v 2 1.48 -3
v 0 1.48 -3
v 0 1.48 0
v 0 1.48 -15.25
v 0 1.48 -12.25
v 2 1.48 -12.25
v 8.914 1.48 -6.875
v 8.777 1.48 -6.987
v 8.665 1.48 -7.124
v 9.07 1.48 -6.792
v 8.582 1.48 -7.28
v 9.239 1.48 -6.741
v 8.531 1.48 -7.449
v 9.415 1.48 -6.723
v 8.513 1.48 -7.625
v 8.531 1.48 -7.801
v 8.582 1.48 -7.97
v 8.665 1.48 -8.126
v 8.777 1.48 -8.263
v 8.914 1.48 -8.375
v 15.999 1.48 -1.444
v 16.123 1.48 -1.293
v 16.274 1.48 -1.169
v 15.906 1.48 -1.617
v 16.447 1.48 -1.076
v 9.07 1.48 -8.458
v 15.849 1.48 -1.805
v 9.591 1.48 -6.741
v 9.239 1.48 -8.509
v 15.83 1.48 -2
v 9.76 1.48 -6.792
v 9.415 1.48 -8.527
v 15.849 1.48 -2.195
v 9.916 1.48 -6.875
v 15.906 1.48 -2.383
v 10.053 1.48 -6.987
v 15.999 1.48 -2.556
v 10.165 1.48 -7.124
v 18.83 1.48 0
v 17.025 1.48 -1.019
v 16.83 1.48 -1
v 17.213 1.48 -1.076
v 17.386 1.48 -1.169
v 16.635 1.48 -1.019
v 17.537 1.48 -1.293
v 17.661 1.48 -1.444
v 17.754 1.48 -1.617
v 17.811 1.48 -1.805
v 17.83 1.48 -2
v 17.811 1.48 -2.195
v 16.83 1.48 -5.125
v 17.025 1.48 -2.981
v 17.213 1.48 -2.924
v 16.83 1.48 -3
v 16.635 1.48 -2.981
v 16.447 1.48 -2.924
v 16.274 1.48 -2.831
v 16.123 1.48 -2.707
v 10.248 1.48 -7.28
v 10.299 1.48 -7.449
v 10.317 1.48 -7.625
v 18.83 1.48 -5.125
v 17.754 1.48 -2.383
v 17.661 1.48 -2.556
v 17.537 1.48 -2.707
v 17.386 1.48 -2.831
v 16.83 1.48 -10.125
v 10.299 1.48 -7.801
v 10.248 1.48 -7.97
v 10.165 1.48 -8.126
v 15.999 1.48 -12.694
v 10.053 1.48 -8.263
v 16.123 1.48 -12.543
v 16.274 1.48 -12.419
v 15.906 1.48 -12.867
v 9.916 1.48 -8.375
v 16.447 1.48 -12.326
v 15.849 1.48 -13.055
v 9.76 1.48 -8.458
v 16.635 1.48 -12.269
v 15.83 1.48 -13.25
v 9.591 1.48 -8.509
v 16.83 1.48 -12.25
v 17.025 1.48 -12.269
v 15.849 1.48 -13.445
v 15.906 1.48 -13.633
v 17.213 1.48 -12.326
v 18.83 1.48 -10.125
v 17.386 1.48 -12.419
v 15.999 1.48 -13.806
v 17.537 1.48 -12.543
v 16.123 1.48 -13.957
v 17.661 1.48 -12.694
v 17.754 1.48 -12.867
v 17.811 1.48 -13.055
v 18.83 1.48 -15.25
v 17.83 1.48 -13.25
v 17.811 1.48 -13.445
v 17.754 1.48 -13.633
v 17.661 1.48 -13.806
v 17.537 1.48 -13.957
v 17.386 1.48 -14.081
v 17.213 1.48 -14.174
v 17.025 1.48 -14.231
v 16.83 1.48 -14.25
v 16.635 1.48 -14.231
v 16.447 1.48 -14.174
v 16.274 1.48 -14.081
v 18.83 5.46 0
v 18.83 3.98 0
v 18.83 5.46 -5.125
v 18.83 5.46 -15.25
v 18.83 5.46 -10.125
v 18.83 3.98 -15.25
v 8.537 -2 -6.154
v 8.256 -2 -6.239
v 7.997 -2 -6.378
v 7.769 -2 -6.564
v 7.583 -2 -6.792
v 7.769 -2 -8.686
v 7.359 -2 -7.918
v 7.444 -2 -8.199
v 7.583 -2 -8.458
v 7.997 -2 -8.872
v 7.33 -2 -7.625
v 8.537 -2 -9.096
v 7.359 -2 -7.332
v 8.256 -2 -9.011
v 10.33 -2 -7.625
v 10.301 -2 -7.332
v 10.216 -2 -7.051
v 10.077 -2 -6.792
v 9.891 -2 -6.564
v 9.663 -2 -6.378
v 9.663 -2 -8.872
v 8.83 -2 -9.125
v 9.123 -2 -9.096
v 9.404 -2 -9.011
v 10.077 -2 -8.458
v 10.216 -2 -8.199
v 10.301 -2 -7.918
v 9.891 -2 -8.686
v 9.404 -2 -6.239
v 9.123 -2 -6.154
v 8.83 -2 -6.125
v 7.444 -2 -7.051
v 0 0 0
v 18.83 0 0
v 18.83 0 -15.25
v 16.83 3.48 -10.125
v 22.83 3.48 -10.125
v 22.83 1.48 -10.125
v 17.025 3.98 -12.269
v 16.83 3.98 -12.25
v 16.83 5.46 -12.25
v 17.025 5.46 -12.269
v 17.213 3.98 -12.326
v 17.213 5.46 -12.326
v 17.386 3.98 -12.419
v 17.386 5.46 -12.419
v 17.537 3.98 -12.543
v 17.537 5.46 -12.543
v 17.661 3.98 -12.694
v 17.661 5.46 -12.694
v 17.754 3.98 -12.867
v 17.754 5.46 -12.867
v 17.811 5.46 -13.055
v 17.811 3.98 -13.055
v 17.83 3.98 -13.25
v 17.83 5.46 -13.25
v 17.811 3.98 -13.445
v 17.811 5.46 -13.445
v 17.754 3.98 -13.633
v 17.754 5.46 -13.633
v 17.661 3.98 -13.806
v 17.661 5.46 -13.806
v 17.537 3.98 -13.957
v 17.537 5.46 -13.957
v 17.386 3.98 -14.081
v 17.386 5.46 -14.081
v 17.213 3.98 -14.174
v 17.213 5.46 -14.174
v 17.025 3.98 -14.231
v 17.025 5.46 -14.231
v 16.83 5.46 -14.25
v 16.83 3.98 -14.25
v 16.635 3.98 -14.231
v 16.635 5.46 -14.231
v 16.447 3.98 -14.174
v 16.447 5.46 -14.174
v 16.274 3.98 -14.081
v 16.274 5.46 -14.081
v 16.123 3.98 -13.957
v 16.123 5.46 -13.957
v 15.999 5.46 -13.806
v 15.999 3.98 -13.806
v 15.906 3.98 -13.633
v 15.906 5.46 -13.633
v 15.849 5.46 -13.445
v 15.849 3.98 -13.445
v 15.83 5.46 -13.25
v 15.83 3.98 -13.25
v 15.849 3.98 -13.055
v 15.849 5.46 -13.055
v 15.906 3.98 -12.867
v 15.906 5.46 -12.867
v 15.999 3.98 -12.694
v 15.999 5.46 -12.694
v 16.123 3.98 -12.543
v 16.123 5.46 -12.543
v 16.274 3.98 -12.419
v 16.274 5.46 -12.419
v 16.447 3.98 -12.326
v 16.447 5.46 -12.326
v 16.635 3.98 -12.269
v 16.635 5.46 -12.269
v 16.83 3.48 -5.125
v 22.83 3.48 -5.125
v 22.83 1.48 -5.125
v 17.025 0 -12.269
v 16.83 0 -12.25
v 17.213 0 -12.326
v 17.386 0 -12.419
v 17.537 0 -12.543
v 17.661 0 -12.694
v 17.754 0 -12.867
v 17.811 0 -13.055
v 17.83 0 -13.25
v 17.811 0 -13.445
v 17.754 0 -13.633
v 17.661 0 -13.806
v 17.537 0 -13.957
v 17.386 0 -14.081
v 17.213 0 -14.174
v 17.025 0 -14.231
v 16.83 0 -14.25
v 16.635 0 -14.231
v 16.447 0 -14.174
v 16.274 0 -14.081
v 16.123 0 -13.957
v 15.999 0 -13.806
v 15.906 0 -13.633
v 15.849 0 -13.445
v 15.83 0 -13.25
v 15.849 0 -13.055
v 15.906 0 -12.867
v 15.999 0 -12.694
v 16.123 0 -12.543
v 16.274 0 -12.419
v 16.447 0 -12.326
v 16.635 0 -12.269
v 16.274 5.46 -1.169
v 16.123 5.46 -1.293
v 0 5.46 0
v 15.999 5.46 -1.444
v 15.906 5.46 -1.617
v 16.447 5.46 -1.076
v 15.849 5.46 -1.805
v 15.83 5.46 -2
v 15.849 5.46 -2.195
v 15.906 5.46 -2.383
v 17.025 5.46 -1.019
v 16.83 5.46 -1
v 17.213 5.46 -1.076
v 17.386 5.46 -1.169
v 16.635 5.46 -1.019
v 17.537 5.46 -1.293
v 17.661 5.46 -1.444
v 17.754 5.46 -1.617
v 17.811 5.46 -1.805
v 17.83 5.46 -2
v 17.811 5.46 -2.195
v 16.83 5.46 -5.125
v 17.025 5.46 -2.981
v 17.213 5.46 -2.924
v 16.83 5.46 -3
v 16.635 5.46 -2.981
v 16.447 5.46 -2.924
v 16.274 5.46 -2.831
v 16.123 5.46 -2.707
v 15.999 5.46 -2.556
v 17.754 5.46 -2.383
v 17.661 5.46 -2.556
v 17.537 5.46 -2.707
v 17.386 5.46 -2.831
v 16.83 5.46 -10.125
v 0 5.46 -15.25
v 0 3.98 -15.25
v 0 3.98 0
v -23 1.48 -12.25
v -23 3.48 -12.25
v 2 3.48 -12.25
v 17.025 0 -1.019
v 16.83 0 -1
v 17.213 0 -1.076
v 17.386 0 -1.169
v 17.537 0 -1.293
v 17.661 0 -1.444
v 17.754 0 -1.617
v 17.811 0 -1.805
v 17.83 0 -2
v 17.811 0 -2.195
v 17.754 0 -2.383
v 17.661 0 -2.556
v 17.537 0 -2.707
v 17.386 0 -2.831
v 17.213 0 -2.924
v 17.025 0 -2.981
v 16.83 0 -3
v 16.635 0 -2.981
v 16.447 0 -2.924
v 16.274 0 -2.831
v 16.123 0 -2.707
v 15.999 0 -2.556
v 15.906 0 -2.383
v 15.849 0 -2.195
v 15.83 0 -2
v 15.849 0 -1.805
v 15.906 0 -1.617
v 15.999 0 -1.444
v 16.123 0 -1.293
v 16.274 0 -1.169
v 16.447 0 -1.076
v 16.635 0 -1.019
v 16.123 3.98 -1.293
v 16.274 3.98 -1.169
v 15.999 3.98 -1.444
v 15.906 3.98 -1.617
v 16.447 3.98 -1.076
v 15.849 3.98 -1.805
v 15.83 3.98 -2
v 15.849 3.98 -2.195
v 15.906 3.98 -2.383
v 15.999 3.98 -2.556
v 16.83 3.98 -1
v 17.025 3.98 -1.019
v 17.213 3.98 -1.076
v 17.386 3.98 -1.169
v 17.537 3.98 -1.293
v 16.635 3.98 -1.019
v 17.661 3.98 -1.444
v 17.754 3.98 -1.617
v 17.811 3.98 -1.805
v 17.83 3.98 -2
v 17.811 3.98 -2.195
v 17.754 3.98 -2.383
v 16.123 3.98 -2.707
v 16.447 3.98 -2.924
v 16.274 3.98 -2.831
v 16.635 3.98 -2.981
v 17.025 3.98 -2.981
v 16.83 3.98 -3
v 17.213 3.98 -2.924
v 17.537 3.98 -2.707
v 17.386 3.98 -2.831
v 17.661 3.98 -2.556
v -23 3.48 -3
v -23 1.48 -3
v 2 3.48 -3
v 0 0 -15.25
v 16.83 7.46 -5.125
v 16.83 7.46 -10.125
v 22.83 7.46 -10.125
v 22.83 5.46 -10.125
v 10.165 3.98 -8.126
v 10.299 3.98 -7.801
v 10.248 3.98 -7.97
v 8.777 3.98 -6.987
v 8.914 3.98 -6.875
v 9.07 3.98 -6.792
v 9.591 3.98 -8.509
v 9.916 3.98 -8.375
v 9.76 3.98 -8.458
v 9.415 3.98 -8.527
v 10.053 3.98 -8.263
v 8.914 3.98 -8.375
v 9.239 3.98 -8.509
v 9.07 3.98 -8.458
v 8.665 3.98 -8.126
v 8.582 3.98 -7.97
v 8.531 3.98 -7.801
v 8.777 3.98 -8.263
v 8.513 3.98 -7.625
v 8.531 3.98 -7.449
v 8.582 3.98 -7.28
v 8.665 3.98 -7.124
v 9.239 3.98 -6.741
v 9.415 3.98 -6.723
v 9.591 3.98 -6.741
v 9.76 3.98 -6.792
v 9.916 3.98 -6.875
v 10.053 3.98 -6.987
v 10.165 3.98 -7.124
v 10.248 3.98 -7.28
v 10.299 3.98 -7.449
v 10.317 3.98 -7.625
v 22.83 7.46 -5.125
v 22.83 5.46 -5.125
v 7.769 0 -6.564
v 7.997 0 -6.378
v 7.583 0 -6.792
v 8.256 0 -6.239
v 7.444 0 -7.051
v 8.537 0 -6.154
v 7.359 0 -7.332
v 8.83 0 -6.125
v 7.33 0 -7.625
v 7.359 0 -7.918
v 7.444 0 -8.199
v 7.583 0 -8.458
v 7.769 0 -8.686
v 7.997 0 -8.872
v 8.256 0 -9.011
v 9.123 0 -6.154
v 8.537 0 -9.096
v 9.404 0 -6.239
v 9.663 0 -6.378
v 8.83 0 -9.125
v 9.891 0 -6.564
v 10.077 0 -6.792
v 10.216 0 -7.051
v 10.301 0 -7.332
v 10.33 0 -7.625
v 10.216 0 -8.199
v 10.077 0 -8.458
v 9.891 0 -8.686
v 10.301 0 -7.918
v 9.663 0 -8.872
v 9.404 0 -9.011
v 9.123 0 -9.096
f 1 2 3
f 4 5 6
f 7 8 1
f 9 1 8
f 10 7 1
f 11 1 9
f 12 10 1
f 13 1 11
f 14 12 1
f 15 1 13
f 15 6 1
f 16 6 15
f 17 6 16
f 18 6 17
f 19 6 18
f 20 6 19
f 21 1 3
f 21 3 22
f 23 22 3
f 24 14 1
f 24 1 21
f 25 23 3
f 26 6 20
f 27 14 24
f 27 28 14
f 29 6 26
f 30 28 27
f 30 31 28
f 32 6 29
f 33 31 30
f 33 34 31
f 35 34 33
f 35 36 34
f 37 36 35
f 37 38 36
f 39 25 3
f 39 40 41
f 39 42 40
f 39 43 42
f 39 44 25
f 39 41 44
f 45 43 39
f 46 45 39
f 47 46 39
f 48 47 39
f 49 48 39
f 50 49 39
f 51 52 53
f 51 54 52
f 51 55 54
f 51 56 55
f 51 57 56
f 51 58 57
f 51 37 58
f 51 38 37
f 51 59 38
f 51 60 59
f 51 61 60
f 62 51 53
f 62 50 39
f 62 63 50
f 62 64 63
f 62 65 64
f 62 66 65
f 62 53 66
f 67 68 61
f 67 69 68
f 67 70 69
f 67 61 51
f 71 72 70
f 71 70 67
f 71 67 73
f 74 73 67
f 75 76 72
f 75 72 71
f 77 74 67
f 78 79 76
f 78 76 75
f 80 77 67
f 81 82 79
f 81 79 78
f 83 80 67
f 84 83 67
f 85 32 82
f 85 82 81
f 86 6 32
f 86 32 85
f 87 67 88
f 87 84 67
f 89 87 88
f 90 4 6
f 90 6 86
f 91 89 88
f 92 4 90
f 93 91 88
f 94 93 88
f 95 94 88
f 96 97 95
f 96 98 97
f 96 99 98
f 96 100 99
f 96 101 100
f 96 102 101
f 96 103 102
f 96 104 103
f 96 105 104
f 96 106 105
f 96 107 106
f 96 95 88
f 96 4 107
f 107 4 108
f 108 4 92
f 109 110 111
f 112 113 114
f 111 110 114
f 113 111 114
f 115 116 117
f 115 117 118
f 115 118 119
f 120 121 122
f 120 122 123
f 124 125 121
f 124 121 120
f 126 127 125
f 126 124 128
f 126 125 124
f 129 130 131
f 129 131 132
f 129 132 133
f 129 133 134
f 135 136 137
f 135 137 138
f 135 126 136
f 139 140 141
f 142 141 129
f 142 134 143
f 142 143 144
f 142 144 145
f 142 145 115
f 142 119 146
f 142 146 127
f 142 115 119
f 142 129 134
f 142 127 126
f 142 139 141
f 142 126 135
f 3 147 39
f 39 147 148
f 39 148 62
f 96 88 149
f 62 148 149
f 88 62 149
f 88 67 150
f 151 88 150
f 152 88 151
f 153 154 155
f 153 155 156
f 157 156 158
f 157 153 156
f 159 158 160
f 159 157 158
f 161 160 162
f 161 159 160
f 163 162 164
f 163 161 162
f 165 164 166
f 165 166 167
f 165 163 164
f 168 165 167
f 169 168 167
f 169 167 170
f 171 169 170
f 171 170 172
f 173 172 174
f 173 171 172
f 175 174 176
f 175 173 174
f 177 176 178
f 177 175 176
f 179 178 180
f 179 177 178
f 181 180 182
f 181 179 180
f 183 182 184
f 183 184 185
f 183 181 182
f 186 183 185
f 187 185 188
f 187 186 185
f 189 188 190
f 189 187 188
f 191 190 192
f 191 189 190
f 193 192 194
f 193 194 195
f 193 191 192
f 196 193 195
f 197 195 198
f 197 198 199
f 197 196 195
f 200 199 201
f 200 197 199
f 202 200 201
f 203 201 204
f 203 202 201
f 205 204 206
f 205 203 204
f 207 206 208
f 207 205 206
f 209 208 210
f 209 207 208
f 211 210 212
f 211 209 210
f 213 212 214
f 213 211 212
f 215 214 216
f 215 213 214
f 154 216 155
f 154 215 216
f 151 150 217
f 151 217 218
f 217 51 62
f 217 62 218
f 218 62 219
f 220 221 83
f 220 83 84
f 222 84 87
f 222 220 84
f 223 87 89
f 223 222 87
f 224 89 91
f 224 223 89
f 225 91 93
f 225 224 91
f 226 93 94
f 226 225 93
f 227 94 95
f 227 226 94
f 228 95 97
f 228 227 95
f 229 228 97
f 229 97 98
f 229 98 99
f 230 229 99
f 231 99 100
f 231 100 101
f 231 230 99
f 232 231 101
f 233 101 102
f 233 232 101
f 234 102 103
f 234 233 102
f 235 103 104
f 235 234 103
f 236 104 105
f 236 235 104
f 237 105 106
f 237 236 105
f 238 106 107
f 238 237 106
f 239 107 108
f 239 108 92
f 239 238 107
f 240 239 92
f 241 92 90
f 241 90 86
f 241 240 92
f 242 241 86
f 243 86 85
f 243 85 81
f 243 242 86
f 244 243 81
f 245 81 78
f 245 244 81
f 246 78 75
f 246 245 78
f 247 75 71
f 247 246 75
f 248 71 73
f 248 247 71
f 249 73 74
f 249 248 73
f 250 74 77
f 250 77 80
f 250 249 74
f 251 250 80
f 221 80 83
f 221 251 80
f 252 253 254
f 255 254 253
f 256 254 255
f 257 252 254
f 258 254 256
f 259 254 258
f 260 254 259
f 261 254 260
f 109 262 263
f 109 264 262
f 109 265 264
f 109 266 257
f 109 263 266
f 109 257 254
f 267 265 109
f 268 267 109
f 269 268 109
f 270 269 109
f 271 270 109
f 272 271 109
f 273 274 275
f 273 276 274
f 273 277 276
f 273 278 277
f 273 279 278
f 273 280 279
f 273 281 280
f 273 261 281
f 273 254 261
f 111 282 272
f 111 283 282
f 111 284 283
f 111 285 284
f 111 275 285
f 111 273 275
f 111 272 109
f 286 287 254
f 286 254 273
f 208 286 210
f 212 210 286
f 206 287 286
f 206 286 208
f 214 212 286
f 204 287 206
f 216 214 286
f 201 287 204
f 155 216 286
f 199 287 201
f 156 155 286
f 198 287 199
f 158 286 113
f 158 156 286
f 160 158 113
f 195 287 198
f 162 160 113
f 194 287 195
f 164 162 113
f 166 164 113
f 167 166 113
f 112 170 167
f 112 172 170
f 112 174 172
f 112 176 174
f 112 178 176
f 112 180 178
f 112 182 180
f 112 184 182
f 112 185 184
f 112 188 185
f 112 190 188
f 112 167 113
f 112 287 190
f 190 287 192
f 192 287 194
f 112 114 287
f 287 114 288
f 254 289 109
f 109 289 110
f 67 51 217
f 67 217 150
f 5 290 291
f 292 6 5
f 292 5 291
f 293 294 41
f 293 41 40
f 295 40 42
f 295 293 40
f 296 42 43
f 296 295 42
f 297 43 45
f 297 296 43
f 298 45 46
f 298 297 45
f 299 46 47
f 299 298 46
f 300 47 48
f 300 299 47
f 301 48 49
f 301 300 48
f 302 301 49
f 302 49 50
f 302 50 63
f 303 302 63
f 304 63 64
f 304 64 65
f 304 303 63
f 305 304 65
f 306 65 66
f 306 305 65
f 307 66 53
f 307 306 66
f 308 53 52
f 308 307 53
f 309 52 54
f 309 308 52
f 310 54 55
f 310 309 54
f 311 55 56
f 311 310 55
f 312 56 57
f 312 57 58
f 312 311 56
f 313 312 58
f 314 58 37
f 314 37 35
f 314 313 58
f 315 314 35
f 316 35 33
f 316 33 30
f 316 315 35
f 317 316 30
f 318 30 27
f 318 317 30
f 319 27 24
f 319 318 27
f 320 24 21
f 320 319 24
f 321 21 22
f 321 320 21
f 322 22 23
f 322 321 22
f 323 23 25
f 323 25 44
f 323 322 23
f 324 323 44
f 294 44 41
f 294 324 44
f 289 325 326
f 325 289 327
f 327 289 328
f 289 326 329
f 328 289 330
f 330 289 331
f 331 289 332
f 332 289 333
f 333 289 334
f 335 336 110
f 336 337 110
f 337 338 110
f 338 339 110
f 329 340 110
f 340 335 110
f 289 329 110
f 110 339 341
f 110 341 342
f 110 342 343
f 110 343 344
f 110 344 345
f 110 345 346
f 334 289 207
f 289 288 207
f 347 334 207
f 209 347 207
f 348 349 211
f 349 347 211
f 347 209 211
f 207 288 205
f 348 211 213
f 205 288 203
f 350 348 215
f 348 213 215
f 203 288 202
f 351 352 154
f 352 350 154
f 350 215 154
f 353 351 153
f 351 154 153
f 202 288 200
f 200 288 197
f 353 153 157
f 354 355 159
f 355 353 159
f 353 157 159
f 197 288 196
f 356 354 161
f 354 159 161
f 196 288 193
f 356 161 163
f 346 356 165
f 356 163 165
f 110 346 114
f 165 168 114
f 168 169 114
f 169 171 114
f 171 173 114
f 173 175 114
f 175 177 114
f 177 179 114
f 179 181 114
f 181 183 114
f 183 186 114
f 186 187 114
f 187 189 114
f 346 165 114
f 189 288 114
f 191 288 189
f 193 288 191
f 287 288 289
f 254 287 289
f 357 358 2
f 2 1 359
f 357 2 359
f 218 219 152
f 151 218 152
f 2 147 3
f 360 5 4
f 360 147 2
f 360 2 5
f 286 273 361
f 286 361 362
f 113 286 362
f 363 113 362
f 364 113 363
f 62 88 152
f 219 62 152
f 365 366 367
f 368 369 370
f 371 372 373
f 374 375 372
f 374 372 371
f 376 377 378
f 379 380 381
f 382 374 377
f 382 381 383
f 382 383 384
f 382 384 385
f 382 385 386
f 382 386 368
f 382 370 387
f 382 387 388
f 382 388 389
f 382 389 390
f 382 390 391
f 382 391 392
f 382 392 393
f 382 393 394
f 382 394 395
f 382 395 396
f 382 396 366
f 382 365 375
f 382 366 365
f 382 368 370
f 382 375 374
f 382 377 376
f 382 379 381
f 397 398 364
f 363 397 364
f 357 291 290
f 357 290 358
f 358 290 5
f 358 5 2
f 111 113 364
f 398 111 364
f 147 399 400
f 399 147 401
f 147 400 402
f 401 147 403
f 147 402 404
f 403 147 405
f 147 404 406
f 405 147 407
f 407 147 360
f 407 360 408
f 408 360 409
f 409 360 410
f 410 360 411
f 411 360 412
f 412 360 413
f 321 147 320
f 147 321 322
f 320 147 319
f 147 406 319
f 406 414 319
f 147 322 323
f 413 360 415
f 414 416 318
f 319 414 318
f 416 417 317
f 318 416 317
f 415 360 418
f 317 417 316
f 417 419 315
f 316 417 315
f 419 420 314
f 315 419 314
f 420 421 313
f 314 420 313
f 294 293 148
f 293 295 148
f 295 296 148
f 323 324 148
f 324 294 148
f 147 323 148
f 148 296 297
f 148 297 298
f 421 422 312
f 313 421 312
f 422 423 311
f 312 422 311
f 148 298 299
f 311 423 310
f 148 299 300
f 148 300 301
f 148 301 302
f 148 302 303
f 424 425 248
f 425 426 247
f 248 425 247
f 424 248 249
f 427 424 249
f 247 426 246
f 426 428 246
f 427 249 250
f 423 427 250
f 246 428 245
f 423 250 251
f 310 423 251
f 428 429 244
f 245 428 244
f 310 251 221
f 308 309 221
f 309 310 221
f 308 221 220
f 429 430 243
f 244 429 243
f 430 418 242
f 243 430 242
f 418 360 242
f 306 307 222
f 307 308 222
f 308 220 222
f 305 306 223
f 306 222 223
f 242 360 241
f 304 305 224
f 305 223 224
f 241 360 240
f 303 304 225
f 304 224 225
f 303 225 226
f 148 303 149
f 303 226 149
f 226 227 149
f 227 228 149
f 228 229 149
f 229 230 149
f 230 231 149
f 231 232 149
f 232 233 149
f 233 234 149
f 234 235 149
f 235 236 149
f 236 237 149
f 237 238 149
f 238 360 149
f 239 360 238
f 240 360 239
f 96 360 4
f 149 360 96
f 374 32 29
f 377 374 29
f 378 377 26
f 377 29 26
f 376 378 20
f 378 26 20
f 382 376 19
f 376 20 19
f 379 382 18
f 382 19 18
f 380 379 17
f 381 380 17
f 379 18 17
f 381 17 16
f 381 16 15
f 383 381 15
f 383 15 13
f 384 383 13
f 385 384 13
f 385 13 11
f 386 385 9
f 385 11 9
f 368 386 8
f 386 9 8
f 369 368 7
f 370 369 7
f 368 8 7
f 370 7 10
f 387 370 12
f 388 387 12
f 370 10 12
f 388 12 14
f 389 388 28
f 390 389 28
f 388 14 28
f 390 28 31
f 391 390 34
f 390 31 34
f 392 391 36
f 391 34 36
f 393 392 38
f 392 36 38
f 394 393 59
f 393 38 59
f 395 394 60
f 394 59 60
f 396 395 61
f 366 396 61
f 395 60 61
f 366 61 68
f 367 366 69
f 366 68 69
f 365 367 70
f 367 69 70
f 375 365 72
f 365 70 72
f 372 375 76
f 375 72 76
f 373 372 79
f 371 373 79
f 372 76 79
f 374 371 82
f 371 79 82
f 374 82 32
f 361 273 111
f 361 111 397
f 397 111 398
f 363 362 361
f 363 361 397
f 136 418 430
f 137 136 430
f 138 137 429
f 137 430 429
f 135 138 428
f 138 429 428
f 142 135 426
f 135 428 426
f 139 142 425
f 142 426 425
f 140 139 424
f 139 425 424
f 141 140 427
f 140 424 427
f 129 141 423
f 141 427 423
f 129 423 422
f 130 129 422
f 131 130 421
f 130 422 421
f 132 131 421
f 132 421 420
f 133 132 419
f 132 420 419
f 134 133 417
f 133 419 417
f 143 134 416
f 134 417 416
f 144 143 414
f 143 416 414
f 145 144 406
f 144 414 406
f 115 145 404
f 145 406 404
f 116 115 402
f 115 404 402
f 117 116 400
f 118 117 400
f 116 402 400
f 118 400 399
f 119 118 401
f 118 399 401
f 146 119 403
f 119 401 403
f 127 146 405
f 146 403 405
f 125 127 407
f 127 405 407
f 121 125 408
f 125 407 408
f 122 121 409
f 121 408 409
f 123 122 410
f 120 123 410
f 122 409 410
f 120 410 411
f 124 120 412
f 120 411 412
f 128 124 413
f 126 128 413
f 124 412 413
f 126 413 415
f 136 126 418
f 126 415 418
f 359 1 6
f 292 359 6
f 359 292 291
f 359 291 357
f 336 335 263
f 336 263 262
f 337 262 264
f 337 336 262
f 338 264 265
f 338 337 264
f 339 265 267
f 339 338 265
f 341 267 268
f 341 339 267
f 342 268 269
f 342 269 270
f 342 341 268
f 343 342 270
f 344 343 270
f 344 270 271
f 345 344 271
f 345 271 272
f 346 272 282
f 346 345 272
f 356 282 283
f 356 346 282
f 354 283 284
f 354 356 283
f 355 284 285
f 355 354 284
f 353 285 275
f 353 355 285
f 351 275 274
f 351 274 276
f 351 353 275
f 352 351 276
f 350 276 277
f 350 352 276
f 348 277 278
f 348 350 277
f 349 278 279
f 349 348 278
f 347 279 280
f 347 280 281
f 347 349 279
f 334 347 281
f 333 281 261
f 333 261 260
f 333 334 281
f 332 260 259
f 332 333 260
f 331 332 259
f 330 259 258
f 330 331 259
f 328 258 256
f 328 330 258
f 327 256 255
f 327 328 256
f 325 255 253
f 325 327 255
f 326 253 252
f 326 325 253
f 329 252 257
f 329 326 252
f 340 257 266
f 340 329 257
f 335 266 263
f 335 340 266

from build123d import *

# Parameters (mm, degrees)
SKETCH1_W           = 18.83
SKETCH1_H           = 15.25
SKETCH1_R           = 1
BOSS_EXTRUDE1_DEPTH = 1.48
SKETCH2_W           = 6
SKETCH2_H           = 5
BOSS_EXTRUDE2_DEPTH = 2
SKETCH3_R           = 0.901743866
BOSS_EXTRUDE3_DEPTH = 2.5
SKETCH4_W           = 2
SKETCH4_H           = 5
SKETCH4_R           = 1
BOSS_EXTRUDE4_DEPTH = 1.48
SKETCH5_W           = 6
SKETCH5_H           = 5
BOSS_EXTRUDE5_DEPTH = 2
SKETCH6_W           = 2
SKETCH6_H           = 9.25
BOSS_EXTRUDE6_DEPTH = 2
SKETCH7_W           = 9.25
SKETCH7_H           = 2
BOSS_EXTRUDE7_DEPTH = 23
SKETCH9_R           = 1.5
BOSS_EXTRUDE8_DEPTH = 2


with BuildPart() as part:
    # Sketch1 → Boss-Extrude1 (new body)
    with BuildSketch(Plane(origin=(0, 0, 0), x_dir=(1, 0, 0), z_dir=(0, 1, 0))):
        with Locations((9.415, 7.625)):
            Rectangle(SKETCH1_W, SKETCH1_H)
        with Locations(Location((16.83, 13.25, 0), (0, 0, 270))):
            Circle(SKETCH1_R, mode=Mode.SUBTRACT)
        with Locations(Location((16.83, 2, 0), (0, 0, 270))):
            Circle(SKETCH1_R, mode=Mode.SUBTRACT)
    extrude(amount=BOSS_EXTRUDE1_DEPTH)

    # Sketch2 → Boss-Extrude2 (add)
    with BuildSketch(Plane(origin=(0, 1.48, 0), x_dir=(1, 0, 0), z_dir=(0, 1, 0))):
        with Locations((19.83, 7.625)):
            Rectangle(SKETCH2_W, SKETCH2_H)
    extrude(amount=BOSS_EXTRUDE2_DEPTH)

    # Sketch3 → Boss-Extrude3 (add)
    with BuildSketch(Plane(origin=(0, 1.48, 0), x_dir=(1, 0, 0), z_dir=(0, 1, 0))):
        with Locations(Location((9.415, 7.625, 0), (0, 0, 90))):
            Circle(SKETCH3_R)
    extrude(amount=BOSS_EXTRUDE3_DEPTH)

    # Sketch6 → Boss-Extrude6 (add)
    with BuildSketch(Plane(origin=(0, 1.48, 0), x_dir=(1, 0, 0), z_dir=(0, 1, 0))):
        with Locations((1, 7.625)):
            Rectangle(SKETCH6_W, SKETCH6_H)
    extrude(amount=BOSS_EXTRUDE6_DEPTH)

    # Sketch7 → Boss-Extrude7 (add)
    with BuildSketch(Plane.ZY):
        with Locations((-7.625, 2.48)):
            Rectangle(SKETCH7_W, SKETCH7_H)
    extrude(amount=BOSS_EXTRUDE7_DEPTH)

    # Sketch9 → Boss-Extrude8 (add)
    with BuildSketch(Plane.XZ):
        with Locations(Location((8.83, -7.625, 0), (0, 0, 270))):
            Circle(SKETCH9_R)
    extrude(amount=BOSS_EXTRUDE8_DEPTH)


with BuildPart() as body_2:
    # Sketch4 → Boss-Extrude4 (new body)
    # profile 1 of 2: a face of its own
    with BuildSketch(Plane(origin=(0, 3.98, 0), x_dir=(1, 0, 0), z_dir=(0, 1, 0))):
        with Locations((17.83, 7.625)):
            Rectangle(SKETCH4_W, SKETCH4_H)
    # profile 2 of 2: a face of its own
    with BuildSketch(Plane(origin=(0, 3.98, 0), x_dir=(1, 0, 0), z_dir=(0, 1, 0))):
        Polygon((18.83, 0), (18.83, 5.125), (16.83, 5.125), (16.83, 10.125), (18.83, 10.125), (18.83, 15.25), (0, 15.25), (0, 0), align=None)
        with Locations(Location((16.83, 2, 0), (0, 0, 270))):
            Circle(SKETCH4_R, mode=Mode.SUBTRACT)
        with Locations(Location((16.83, 13.25, 0), (0, 0, 270))):
            Circle(SKETCH4_R, mode=Mode.SUBTRACT)
    extrude(amount=BOSS_EXTRUDE4_DEPTH)

    # Sketch5 → Boss-Extrude5 (add)
    with BuildSketch(Plane(origin=(0, 5.46, 0), x_dir=(1, 0, 0), z_dir=(0, 1, 0))):
        with Locations((19.83, 7.625)):
            Rectangle(SKETCH5_W, SKETCH5_H)
    extrude(amount=BOSS_EXTRUDE5_DEPTH)


solid = Compound([part.part, body_2.part])
